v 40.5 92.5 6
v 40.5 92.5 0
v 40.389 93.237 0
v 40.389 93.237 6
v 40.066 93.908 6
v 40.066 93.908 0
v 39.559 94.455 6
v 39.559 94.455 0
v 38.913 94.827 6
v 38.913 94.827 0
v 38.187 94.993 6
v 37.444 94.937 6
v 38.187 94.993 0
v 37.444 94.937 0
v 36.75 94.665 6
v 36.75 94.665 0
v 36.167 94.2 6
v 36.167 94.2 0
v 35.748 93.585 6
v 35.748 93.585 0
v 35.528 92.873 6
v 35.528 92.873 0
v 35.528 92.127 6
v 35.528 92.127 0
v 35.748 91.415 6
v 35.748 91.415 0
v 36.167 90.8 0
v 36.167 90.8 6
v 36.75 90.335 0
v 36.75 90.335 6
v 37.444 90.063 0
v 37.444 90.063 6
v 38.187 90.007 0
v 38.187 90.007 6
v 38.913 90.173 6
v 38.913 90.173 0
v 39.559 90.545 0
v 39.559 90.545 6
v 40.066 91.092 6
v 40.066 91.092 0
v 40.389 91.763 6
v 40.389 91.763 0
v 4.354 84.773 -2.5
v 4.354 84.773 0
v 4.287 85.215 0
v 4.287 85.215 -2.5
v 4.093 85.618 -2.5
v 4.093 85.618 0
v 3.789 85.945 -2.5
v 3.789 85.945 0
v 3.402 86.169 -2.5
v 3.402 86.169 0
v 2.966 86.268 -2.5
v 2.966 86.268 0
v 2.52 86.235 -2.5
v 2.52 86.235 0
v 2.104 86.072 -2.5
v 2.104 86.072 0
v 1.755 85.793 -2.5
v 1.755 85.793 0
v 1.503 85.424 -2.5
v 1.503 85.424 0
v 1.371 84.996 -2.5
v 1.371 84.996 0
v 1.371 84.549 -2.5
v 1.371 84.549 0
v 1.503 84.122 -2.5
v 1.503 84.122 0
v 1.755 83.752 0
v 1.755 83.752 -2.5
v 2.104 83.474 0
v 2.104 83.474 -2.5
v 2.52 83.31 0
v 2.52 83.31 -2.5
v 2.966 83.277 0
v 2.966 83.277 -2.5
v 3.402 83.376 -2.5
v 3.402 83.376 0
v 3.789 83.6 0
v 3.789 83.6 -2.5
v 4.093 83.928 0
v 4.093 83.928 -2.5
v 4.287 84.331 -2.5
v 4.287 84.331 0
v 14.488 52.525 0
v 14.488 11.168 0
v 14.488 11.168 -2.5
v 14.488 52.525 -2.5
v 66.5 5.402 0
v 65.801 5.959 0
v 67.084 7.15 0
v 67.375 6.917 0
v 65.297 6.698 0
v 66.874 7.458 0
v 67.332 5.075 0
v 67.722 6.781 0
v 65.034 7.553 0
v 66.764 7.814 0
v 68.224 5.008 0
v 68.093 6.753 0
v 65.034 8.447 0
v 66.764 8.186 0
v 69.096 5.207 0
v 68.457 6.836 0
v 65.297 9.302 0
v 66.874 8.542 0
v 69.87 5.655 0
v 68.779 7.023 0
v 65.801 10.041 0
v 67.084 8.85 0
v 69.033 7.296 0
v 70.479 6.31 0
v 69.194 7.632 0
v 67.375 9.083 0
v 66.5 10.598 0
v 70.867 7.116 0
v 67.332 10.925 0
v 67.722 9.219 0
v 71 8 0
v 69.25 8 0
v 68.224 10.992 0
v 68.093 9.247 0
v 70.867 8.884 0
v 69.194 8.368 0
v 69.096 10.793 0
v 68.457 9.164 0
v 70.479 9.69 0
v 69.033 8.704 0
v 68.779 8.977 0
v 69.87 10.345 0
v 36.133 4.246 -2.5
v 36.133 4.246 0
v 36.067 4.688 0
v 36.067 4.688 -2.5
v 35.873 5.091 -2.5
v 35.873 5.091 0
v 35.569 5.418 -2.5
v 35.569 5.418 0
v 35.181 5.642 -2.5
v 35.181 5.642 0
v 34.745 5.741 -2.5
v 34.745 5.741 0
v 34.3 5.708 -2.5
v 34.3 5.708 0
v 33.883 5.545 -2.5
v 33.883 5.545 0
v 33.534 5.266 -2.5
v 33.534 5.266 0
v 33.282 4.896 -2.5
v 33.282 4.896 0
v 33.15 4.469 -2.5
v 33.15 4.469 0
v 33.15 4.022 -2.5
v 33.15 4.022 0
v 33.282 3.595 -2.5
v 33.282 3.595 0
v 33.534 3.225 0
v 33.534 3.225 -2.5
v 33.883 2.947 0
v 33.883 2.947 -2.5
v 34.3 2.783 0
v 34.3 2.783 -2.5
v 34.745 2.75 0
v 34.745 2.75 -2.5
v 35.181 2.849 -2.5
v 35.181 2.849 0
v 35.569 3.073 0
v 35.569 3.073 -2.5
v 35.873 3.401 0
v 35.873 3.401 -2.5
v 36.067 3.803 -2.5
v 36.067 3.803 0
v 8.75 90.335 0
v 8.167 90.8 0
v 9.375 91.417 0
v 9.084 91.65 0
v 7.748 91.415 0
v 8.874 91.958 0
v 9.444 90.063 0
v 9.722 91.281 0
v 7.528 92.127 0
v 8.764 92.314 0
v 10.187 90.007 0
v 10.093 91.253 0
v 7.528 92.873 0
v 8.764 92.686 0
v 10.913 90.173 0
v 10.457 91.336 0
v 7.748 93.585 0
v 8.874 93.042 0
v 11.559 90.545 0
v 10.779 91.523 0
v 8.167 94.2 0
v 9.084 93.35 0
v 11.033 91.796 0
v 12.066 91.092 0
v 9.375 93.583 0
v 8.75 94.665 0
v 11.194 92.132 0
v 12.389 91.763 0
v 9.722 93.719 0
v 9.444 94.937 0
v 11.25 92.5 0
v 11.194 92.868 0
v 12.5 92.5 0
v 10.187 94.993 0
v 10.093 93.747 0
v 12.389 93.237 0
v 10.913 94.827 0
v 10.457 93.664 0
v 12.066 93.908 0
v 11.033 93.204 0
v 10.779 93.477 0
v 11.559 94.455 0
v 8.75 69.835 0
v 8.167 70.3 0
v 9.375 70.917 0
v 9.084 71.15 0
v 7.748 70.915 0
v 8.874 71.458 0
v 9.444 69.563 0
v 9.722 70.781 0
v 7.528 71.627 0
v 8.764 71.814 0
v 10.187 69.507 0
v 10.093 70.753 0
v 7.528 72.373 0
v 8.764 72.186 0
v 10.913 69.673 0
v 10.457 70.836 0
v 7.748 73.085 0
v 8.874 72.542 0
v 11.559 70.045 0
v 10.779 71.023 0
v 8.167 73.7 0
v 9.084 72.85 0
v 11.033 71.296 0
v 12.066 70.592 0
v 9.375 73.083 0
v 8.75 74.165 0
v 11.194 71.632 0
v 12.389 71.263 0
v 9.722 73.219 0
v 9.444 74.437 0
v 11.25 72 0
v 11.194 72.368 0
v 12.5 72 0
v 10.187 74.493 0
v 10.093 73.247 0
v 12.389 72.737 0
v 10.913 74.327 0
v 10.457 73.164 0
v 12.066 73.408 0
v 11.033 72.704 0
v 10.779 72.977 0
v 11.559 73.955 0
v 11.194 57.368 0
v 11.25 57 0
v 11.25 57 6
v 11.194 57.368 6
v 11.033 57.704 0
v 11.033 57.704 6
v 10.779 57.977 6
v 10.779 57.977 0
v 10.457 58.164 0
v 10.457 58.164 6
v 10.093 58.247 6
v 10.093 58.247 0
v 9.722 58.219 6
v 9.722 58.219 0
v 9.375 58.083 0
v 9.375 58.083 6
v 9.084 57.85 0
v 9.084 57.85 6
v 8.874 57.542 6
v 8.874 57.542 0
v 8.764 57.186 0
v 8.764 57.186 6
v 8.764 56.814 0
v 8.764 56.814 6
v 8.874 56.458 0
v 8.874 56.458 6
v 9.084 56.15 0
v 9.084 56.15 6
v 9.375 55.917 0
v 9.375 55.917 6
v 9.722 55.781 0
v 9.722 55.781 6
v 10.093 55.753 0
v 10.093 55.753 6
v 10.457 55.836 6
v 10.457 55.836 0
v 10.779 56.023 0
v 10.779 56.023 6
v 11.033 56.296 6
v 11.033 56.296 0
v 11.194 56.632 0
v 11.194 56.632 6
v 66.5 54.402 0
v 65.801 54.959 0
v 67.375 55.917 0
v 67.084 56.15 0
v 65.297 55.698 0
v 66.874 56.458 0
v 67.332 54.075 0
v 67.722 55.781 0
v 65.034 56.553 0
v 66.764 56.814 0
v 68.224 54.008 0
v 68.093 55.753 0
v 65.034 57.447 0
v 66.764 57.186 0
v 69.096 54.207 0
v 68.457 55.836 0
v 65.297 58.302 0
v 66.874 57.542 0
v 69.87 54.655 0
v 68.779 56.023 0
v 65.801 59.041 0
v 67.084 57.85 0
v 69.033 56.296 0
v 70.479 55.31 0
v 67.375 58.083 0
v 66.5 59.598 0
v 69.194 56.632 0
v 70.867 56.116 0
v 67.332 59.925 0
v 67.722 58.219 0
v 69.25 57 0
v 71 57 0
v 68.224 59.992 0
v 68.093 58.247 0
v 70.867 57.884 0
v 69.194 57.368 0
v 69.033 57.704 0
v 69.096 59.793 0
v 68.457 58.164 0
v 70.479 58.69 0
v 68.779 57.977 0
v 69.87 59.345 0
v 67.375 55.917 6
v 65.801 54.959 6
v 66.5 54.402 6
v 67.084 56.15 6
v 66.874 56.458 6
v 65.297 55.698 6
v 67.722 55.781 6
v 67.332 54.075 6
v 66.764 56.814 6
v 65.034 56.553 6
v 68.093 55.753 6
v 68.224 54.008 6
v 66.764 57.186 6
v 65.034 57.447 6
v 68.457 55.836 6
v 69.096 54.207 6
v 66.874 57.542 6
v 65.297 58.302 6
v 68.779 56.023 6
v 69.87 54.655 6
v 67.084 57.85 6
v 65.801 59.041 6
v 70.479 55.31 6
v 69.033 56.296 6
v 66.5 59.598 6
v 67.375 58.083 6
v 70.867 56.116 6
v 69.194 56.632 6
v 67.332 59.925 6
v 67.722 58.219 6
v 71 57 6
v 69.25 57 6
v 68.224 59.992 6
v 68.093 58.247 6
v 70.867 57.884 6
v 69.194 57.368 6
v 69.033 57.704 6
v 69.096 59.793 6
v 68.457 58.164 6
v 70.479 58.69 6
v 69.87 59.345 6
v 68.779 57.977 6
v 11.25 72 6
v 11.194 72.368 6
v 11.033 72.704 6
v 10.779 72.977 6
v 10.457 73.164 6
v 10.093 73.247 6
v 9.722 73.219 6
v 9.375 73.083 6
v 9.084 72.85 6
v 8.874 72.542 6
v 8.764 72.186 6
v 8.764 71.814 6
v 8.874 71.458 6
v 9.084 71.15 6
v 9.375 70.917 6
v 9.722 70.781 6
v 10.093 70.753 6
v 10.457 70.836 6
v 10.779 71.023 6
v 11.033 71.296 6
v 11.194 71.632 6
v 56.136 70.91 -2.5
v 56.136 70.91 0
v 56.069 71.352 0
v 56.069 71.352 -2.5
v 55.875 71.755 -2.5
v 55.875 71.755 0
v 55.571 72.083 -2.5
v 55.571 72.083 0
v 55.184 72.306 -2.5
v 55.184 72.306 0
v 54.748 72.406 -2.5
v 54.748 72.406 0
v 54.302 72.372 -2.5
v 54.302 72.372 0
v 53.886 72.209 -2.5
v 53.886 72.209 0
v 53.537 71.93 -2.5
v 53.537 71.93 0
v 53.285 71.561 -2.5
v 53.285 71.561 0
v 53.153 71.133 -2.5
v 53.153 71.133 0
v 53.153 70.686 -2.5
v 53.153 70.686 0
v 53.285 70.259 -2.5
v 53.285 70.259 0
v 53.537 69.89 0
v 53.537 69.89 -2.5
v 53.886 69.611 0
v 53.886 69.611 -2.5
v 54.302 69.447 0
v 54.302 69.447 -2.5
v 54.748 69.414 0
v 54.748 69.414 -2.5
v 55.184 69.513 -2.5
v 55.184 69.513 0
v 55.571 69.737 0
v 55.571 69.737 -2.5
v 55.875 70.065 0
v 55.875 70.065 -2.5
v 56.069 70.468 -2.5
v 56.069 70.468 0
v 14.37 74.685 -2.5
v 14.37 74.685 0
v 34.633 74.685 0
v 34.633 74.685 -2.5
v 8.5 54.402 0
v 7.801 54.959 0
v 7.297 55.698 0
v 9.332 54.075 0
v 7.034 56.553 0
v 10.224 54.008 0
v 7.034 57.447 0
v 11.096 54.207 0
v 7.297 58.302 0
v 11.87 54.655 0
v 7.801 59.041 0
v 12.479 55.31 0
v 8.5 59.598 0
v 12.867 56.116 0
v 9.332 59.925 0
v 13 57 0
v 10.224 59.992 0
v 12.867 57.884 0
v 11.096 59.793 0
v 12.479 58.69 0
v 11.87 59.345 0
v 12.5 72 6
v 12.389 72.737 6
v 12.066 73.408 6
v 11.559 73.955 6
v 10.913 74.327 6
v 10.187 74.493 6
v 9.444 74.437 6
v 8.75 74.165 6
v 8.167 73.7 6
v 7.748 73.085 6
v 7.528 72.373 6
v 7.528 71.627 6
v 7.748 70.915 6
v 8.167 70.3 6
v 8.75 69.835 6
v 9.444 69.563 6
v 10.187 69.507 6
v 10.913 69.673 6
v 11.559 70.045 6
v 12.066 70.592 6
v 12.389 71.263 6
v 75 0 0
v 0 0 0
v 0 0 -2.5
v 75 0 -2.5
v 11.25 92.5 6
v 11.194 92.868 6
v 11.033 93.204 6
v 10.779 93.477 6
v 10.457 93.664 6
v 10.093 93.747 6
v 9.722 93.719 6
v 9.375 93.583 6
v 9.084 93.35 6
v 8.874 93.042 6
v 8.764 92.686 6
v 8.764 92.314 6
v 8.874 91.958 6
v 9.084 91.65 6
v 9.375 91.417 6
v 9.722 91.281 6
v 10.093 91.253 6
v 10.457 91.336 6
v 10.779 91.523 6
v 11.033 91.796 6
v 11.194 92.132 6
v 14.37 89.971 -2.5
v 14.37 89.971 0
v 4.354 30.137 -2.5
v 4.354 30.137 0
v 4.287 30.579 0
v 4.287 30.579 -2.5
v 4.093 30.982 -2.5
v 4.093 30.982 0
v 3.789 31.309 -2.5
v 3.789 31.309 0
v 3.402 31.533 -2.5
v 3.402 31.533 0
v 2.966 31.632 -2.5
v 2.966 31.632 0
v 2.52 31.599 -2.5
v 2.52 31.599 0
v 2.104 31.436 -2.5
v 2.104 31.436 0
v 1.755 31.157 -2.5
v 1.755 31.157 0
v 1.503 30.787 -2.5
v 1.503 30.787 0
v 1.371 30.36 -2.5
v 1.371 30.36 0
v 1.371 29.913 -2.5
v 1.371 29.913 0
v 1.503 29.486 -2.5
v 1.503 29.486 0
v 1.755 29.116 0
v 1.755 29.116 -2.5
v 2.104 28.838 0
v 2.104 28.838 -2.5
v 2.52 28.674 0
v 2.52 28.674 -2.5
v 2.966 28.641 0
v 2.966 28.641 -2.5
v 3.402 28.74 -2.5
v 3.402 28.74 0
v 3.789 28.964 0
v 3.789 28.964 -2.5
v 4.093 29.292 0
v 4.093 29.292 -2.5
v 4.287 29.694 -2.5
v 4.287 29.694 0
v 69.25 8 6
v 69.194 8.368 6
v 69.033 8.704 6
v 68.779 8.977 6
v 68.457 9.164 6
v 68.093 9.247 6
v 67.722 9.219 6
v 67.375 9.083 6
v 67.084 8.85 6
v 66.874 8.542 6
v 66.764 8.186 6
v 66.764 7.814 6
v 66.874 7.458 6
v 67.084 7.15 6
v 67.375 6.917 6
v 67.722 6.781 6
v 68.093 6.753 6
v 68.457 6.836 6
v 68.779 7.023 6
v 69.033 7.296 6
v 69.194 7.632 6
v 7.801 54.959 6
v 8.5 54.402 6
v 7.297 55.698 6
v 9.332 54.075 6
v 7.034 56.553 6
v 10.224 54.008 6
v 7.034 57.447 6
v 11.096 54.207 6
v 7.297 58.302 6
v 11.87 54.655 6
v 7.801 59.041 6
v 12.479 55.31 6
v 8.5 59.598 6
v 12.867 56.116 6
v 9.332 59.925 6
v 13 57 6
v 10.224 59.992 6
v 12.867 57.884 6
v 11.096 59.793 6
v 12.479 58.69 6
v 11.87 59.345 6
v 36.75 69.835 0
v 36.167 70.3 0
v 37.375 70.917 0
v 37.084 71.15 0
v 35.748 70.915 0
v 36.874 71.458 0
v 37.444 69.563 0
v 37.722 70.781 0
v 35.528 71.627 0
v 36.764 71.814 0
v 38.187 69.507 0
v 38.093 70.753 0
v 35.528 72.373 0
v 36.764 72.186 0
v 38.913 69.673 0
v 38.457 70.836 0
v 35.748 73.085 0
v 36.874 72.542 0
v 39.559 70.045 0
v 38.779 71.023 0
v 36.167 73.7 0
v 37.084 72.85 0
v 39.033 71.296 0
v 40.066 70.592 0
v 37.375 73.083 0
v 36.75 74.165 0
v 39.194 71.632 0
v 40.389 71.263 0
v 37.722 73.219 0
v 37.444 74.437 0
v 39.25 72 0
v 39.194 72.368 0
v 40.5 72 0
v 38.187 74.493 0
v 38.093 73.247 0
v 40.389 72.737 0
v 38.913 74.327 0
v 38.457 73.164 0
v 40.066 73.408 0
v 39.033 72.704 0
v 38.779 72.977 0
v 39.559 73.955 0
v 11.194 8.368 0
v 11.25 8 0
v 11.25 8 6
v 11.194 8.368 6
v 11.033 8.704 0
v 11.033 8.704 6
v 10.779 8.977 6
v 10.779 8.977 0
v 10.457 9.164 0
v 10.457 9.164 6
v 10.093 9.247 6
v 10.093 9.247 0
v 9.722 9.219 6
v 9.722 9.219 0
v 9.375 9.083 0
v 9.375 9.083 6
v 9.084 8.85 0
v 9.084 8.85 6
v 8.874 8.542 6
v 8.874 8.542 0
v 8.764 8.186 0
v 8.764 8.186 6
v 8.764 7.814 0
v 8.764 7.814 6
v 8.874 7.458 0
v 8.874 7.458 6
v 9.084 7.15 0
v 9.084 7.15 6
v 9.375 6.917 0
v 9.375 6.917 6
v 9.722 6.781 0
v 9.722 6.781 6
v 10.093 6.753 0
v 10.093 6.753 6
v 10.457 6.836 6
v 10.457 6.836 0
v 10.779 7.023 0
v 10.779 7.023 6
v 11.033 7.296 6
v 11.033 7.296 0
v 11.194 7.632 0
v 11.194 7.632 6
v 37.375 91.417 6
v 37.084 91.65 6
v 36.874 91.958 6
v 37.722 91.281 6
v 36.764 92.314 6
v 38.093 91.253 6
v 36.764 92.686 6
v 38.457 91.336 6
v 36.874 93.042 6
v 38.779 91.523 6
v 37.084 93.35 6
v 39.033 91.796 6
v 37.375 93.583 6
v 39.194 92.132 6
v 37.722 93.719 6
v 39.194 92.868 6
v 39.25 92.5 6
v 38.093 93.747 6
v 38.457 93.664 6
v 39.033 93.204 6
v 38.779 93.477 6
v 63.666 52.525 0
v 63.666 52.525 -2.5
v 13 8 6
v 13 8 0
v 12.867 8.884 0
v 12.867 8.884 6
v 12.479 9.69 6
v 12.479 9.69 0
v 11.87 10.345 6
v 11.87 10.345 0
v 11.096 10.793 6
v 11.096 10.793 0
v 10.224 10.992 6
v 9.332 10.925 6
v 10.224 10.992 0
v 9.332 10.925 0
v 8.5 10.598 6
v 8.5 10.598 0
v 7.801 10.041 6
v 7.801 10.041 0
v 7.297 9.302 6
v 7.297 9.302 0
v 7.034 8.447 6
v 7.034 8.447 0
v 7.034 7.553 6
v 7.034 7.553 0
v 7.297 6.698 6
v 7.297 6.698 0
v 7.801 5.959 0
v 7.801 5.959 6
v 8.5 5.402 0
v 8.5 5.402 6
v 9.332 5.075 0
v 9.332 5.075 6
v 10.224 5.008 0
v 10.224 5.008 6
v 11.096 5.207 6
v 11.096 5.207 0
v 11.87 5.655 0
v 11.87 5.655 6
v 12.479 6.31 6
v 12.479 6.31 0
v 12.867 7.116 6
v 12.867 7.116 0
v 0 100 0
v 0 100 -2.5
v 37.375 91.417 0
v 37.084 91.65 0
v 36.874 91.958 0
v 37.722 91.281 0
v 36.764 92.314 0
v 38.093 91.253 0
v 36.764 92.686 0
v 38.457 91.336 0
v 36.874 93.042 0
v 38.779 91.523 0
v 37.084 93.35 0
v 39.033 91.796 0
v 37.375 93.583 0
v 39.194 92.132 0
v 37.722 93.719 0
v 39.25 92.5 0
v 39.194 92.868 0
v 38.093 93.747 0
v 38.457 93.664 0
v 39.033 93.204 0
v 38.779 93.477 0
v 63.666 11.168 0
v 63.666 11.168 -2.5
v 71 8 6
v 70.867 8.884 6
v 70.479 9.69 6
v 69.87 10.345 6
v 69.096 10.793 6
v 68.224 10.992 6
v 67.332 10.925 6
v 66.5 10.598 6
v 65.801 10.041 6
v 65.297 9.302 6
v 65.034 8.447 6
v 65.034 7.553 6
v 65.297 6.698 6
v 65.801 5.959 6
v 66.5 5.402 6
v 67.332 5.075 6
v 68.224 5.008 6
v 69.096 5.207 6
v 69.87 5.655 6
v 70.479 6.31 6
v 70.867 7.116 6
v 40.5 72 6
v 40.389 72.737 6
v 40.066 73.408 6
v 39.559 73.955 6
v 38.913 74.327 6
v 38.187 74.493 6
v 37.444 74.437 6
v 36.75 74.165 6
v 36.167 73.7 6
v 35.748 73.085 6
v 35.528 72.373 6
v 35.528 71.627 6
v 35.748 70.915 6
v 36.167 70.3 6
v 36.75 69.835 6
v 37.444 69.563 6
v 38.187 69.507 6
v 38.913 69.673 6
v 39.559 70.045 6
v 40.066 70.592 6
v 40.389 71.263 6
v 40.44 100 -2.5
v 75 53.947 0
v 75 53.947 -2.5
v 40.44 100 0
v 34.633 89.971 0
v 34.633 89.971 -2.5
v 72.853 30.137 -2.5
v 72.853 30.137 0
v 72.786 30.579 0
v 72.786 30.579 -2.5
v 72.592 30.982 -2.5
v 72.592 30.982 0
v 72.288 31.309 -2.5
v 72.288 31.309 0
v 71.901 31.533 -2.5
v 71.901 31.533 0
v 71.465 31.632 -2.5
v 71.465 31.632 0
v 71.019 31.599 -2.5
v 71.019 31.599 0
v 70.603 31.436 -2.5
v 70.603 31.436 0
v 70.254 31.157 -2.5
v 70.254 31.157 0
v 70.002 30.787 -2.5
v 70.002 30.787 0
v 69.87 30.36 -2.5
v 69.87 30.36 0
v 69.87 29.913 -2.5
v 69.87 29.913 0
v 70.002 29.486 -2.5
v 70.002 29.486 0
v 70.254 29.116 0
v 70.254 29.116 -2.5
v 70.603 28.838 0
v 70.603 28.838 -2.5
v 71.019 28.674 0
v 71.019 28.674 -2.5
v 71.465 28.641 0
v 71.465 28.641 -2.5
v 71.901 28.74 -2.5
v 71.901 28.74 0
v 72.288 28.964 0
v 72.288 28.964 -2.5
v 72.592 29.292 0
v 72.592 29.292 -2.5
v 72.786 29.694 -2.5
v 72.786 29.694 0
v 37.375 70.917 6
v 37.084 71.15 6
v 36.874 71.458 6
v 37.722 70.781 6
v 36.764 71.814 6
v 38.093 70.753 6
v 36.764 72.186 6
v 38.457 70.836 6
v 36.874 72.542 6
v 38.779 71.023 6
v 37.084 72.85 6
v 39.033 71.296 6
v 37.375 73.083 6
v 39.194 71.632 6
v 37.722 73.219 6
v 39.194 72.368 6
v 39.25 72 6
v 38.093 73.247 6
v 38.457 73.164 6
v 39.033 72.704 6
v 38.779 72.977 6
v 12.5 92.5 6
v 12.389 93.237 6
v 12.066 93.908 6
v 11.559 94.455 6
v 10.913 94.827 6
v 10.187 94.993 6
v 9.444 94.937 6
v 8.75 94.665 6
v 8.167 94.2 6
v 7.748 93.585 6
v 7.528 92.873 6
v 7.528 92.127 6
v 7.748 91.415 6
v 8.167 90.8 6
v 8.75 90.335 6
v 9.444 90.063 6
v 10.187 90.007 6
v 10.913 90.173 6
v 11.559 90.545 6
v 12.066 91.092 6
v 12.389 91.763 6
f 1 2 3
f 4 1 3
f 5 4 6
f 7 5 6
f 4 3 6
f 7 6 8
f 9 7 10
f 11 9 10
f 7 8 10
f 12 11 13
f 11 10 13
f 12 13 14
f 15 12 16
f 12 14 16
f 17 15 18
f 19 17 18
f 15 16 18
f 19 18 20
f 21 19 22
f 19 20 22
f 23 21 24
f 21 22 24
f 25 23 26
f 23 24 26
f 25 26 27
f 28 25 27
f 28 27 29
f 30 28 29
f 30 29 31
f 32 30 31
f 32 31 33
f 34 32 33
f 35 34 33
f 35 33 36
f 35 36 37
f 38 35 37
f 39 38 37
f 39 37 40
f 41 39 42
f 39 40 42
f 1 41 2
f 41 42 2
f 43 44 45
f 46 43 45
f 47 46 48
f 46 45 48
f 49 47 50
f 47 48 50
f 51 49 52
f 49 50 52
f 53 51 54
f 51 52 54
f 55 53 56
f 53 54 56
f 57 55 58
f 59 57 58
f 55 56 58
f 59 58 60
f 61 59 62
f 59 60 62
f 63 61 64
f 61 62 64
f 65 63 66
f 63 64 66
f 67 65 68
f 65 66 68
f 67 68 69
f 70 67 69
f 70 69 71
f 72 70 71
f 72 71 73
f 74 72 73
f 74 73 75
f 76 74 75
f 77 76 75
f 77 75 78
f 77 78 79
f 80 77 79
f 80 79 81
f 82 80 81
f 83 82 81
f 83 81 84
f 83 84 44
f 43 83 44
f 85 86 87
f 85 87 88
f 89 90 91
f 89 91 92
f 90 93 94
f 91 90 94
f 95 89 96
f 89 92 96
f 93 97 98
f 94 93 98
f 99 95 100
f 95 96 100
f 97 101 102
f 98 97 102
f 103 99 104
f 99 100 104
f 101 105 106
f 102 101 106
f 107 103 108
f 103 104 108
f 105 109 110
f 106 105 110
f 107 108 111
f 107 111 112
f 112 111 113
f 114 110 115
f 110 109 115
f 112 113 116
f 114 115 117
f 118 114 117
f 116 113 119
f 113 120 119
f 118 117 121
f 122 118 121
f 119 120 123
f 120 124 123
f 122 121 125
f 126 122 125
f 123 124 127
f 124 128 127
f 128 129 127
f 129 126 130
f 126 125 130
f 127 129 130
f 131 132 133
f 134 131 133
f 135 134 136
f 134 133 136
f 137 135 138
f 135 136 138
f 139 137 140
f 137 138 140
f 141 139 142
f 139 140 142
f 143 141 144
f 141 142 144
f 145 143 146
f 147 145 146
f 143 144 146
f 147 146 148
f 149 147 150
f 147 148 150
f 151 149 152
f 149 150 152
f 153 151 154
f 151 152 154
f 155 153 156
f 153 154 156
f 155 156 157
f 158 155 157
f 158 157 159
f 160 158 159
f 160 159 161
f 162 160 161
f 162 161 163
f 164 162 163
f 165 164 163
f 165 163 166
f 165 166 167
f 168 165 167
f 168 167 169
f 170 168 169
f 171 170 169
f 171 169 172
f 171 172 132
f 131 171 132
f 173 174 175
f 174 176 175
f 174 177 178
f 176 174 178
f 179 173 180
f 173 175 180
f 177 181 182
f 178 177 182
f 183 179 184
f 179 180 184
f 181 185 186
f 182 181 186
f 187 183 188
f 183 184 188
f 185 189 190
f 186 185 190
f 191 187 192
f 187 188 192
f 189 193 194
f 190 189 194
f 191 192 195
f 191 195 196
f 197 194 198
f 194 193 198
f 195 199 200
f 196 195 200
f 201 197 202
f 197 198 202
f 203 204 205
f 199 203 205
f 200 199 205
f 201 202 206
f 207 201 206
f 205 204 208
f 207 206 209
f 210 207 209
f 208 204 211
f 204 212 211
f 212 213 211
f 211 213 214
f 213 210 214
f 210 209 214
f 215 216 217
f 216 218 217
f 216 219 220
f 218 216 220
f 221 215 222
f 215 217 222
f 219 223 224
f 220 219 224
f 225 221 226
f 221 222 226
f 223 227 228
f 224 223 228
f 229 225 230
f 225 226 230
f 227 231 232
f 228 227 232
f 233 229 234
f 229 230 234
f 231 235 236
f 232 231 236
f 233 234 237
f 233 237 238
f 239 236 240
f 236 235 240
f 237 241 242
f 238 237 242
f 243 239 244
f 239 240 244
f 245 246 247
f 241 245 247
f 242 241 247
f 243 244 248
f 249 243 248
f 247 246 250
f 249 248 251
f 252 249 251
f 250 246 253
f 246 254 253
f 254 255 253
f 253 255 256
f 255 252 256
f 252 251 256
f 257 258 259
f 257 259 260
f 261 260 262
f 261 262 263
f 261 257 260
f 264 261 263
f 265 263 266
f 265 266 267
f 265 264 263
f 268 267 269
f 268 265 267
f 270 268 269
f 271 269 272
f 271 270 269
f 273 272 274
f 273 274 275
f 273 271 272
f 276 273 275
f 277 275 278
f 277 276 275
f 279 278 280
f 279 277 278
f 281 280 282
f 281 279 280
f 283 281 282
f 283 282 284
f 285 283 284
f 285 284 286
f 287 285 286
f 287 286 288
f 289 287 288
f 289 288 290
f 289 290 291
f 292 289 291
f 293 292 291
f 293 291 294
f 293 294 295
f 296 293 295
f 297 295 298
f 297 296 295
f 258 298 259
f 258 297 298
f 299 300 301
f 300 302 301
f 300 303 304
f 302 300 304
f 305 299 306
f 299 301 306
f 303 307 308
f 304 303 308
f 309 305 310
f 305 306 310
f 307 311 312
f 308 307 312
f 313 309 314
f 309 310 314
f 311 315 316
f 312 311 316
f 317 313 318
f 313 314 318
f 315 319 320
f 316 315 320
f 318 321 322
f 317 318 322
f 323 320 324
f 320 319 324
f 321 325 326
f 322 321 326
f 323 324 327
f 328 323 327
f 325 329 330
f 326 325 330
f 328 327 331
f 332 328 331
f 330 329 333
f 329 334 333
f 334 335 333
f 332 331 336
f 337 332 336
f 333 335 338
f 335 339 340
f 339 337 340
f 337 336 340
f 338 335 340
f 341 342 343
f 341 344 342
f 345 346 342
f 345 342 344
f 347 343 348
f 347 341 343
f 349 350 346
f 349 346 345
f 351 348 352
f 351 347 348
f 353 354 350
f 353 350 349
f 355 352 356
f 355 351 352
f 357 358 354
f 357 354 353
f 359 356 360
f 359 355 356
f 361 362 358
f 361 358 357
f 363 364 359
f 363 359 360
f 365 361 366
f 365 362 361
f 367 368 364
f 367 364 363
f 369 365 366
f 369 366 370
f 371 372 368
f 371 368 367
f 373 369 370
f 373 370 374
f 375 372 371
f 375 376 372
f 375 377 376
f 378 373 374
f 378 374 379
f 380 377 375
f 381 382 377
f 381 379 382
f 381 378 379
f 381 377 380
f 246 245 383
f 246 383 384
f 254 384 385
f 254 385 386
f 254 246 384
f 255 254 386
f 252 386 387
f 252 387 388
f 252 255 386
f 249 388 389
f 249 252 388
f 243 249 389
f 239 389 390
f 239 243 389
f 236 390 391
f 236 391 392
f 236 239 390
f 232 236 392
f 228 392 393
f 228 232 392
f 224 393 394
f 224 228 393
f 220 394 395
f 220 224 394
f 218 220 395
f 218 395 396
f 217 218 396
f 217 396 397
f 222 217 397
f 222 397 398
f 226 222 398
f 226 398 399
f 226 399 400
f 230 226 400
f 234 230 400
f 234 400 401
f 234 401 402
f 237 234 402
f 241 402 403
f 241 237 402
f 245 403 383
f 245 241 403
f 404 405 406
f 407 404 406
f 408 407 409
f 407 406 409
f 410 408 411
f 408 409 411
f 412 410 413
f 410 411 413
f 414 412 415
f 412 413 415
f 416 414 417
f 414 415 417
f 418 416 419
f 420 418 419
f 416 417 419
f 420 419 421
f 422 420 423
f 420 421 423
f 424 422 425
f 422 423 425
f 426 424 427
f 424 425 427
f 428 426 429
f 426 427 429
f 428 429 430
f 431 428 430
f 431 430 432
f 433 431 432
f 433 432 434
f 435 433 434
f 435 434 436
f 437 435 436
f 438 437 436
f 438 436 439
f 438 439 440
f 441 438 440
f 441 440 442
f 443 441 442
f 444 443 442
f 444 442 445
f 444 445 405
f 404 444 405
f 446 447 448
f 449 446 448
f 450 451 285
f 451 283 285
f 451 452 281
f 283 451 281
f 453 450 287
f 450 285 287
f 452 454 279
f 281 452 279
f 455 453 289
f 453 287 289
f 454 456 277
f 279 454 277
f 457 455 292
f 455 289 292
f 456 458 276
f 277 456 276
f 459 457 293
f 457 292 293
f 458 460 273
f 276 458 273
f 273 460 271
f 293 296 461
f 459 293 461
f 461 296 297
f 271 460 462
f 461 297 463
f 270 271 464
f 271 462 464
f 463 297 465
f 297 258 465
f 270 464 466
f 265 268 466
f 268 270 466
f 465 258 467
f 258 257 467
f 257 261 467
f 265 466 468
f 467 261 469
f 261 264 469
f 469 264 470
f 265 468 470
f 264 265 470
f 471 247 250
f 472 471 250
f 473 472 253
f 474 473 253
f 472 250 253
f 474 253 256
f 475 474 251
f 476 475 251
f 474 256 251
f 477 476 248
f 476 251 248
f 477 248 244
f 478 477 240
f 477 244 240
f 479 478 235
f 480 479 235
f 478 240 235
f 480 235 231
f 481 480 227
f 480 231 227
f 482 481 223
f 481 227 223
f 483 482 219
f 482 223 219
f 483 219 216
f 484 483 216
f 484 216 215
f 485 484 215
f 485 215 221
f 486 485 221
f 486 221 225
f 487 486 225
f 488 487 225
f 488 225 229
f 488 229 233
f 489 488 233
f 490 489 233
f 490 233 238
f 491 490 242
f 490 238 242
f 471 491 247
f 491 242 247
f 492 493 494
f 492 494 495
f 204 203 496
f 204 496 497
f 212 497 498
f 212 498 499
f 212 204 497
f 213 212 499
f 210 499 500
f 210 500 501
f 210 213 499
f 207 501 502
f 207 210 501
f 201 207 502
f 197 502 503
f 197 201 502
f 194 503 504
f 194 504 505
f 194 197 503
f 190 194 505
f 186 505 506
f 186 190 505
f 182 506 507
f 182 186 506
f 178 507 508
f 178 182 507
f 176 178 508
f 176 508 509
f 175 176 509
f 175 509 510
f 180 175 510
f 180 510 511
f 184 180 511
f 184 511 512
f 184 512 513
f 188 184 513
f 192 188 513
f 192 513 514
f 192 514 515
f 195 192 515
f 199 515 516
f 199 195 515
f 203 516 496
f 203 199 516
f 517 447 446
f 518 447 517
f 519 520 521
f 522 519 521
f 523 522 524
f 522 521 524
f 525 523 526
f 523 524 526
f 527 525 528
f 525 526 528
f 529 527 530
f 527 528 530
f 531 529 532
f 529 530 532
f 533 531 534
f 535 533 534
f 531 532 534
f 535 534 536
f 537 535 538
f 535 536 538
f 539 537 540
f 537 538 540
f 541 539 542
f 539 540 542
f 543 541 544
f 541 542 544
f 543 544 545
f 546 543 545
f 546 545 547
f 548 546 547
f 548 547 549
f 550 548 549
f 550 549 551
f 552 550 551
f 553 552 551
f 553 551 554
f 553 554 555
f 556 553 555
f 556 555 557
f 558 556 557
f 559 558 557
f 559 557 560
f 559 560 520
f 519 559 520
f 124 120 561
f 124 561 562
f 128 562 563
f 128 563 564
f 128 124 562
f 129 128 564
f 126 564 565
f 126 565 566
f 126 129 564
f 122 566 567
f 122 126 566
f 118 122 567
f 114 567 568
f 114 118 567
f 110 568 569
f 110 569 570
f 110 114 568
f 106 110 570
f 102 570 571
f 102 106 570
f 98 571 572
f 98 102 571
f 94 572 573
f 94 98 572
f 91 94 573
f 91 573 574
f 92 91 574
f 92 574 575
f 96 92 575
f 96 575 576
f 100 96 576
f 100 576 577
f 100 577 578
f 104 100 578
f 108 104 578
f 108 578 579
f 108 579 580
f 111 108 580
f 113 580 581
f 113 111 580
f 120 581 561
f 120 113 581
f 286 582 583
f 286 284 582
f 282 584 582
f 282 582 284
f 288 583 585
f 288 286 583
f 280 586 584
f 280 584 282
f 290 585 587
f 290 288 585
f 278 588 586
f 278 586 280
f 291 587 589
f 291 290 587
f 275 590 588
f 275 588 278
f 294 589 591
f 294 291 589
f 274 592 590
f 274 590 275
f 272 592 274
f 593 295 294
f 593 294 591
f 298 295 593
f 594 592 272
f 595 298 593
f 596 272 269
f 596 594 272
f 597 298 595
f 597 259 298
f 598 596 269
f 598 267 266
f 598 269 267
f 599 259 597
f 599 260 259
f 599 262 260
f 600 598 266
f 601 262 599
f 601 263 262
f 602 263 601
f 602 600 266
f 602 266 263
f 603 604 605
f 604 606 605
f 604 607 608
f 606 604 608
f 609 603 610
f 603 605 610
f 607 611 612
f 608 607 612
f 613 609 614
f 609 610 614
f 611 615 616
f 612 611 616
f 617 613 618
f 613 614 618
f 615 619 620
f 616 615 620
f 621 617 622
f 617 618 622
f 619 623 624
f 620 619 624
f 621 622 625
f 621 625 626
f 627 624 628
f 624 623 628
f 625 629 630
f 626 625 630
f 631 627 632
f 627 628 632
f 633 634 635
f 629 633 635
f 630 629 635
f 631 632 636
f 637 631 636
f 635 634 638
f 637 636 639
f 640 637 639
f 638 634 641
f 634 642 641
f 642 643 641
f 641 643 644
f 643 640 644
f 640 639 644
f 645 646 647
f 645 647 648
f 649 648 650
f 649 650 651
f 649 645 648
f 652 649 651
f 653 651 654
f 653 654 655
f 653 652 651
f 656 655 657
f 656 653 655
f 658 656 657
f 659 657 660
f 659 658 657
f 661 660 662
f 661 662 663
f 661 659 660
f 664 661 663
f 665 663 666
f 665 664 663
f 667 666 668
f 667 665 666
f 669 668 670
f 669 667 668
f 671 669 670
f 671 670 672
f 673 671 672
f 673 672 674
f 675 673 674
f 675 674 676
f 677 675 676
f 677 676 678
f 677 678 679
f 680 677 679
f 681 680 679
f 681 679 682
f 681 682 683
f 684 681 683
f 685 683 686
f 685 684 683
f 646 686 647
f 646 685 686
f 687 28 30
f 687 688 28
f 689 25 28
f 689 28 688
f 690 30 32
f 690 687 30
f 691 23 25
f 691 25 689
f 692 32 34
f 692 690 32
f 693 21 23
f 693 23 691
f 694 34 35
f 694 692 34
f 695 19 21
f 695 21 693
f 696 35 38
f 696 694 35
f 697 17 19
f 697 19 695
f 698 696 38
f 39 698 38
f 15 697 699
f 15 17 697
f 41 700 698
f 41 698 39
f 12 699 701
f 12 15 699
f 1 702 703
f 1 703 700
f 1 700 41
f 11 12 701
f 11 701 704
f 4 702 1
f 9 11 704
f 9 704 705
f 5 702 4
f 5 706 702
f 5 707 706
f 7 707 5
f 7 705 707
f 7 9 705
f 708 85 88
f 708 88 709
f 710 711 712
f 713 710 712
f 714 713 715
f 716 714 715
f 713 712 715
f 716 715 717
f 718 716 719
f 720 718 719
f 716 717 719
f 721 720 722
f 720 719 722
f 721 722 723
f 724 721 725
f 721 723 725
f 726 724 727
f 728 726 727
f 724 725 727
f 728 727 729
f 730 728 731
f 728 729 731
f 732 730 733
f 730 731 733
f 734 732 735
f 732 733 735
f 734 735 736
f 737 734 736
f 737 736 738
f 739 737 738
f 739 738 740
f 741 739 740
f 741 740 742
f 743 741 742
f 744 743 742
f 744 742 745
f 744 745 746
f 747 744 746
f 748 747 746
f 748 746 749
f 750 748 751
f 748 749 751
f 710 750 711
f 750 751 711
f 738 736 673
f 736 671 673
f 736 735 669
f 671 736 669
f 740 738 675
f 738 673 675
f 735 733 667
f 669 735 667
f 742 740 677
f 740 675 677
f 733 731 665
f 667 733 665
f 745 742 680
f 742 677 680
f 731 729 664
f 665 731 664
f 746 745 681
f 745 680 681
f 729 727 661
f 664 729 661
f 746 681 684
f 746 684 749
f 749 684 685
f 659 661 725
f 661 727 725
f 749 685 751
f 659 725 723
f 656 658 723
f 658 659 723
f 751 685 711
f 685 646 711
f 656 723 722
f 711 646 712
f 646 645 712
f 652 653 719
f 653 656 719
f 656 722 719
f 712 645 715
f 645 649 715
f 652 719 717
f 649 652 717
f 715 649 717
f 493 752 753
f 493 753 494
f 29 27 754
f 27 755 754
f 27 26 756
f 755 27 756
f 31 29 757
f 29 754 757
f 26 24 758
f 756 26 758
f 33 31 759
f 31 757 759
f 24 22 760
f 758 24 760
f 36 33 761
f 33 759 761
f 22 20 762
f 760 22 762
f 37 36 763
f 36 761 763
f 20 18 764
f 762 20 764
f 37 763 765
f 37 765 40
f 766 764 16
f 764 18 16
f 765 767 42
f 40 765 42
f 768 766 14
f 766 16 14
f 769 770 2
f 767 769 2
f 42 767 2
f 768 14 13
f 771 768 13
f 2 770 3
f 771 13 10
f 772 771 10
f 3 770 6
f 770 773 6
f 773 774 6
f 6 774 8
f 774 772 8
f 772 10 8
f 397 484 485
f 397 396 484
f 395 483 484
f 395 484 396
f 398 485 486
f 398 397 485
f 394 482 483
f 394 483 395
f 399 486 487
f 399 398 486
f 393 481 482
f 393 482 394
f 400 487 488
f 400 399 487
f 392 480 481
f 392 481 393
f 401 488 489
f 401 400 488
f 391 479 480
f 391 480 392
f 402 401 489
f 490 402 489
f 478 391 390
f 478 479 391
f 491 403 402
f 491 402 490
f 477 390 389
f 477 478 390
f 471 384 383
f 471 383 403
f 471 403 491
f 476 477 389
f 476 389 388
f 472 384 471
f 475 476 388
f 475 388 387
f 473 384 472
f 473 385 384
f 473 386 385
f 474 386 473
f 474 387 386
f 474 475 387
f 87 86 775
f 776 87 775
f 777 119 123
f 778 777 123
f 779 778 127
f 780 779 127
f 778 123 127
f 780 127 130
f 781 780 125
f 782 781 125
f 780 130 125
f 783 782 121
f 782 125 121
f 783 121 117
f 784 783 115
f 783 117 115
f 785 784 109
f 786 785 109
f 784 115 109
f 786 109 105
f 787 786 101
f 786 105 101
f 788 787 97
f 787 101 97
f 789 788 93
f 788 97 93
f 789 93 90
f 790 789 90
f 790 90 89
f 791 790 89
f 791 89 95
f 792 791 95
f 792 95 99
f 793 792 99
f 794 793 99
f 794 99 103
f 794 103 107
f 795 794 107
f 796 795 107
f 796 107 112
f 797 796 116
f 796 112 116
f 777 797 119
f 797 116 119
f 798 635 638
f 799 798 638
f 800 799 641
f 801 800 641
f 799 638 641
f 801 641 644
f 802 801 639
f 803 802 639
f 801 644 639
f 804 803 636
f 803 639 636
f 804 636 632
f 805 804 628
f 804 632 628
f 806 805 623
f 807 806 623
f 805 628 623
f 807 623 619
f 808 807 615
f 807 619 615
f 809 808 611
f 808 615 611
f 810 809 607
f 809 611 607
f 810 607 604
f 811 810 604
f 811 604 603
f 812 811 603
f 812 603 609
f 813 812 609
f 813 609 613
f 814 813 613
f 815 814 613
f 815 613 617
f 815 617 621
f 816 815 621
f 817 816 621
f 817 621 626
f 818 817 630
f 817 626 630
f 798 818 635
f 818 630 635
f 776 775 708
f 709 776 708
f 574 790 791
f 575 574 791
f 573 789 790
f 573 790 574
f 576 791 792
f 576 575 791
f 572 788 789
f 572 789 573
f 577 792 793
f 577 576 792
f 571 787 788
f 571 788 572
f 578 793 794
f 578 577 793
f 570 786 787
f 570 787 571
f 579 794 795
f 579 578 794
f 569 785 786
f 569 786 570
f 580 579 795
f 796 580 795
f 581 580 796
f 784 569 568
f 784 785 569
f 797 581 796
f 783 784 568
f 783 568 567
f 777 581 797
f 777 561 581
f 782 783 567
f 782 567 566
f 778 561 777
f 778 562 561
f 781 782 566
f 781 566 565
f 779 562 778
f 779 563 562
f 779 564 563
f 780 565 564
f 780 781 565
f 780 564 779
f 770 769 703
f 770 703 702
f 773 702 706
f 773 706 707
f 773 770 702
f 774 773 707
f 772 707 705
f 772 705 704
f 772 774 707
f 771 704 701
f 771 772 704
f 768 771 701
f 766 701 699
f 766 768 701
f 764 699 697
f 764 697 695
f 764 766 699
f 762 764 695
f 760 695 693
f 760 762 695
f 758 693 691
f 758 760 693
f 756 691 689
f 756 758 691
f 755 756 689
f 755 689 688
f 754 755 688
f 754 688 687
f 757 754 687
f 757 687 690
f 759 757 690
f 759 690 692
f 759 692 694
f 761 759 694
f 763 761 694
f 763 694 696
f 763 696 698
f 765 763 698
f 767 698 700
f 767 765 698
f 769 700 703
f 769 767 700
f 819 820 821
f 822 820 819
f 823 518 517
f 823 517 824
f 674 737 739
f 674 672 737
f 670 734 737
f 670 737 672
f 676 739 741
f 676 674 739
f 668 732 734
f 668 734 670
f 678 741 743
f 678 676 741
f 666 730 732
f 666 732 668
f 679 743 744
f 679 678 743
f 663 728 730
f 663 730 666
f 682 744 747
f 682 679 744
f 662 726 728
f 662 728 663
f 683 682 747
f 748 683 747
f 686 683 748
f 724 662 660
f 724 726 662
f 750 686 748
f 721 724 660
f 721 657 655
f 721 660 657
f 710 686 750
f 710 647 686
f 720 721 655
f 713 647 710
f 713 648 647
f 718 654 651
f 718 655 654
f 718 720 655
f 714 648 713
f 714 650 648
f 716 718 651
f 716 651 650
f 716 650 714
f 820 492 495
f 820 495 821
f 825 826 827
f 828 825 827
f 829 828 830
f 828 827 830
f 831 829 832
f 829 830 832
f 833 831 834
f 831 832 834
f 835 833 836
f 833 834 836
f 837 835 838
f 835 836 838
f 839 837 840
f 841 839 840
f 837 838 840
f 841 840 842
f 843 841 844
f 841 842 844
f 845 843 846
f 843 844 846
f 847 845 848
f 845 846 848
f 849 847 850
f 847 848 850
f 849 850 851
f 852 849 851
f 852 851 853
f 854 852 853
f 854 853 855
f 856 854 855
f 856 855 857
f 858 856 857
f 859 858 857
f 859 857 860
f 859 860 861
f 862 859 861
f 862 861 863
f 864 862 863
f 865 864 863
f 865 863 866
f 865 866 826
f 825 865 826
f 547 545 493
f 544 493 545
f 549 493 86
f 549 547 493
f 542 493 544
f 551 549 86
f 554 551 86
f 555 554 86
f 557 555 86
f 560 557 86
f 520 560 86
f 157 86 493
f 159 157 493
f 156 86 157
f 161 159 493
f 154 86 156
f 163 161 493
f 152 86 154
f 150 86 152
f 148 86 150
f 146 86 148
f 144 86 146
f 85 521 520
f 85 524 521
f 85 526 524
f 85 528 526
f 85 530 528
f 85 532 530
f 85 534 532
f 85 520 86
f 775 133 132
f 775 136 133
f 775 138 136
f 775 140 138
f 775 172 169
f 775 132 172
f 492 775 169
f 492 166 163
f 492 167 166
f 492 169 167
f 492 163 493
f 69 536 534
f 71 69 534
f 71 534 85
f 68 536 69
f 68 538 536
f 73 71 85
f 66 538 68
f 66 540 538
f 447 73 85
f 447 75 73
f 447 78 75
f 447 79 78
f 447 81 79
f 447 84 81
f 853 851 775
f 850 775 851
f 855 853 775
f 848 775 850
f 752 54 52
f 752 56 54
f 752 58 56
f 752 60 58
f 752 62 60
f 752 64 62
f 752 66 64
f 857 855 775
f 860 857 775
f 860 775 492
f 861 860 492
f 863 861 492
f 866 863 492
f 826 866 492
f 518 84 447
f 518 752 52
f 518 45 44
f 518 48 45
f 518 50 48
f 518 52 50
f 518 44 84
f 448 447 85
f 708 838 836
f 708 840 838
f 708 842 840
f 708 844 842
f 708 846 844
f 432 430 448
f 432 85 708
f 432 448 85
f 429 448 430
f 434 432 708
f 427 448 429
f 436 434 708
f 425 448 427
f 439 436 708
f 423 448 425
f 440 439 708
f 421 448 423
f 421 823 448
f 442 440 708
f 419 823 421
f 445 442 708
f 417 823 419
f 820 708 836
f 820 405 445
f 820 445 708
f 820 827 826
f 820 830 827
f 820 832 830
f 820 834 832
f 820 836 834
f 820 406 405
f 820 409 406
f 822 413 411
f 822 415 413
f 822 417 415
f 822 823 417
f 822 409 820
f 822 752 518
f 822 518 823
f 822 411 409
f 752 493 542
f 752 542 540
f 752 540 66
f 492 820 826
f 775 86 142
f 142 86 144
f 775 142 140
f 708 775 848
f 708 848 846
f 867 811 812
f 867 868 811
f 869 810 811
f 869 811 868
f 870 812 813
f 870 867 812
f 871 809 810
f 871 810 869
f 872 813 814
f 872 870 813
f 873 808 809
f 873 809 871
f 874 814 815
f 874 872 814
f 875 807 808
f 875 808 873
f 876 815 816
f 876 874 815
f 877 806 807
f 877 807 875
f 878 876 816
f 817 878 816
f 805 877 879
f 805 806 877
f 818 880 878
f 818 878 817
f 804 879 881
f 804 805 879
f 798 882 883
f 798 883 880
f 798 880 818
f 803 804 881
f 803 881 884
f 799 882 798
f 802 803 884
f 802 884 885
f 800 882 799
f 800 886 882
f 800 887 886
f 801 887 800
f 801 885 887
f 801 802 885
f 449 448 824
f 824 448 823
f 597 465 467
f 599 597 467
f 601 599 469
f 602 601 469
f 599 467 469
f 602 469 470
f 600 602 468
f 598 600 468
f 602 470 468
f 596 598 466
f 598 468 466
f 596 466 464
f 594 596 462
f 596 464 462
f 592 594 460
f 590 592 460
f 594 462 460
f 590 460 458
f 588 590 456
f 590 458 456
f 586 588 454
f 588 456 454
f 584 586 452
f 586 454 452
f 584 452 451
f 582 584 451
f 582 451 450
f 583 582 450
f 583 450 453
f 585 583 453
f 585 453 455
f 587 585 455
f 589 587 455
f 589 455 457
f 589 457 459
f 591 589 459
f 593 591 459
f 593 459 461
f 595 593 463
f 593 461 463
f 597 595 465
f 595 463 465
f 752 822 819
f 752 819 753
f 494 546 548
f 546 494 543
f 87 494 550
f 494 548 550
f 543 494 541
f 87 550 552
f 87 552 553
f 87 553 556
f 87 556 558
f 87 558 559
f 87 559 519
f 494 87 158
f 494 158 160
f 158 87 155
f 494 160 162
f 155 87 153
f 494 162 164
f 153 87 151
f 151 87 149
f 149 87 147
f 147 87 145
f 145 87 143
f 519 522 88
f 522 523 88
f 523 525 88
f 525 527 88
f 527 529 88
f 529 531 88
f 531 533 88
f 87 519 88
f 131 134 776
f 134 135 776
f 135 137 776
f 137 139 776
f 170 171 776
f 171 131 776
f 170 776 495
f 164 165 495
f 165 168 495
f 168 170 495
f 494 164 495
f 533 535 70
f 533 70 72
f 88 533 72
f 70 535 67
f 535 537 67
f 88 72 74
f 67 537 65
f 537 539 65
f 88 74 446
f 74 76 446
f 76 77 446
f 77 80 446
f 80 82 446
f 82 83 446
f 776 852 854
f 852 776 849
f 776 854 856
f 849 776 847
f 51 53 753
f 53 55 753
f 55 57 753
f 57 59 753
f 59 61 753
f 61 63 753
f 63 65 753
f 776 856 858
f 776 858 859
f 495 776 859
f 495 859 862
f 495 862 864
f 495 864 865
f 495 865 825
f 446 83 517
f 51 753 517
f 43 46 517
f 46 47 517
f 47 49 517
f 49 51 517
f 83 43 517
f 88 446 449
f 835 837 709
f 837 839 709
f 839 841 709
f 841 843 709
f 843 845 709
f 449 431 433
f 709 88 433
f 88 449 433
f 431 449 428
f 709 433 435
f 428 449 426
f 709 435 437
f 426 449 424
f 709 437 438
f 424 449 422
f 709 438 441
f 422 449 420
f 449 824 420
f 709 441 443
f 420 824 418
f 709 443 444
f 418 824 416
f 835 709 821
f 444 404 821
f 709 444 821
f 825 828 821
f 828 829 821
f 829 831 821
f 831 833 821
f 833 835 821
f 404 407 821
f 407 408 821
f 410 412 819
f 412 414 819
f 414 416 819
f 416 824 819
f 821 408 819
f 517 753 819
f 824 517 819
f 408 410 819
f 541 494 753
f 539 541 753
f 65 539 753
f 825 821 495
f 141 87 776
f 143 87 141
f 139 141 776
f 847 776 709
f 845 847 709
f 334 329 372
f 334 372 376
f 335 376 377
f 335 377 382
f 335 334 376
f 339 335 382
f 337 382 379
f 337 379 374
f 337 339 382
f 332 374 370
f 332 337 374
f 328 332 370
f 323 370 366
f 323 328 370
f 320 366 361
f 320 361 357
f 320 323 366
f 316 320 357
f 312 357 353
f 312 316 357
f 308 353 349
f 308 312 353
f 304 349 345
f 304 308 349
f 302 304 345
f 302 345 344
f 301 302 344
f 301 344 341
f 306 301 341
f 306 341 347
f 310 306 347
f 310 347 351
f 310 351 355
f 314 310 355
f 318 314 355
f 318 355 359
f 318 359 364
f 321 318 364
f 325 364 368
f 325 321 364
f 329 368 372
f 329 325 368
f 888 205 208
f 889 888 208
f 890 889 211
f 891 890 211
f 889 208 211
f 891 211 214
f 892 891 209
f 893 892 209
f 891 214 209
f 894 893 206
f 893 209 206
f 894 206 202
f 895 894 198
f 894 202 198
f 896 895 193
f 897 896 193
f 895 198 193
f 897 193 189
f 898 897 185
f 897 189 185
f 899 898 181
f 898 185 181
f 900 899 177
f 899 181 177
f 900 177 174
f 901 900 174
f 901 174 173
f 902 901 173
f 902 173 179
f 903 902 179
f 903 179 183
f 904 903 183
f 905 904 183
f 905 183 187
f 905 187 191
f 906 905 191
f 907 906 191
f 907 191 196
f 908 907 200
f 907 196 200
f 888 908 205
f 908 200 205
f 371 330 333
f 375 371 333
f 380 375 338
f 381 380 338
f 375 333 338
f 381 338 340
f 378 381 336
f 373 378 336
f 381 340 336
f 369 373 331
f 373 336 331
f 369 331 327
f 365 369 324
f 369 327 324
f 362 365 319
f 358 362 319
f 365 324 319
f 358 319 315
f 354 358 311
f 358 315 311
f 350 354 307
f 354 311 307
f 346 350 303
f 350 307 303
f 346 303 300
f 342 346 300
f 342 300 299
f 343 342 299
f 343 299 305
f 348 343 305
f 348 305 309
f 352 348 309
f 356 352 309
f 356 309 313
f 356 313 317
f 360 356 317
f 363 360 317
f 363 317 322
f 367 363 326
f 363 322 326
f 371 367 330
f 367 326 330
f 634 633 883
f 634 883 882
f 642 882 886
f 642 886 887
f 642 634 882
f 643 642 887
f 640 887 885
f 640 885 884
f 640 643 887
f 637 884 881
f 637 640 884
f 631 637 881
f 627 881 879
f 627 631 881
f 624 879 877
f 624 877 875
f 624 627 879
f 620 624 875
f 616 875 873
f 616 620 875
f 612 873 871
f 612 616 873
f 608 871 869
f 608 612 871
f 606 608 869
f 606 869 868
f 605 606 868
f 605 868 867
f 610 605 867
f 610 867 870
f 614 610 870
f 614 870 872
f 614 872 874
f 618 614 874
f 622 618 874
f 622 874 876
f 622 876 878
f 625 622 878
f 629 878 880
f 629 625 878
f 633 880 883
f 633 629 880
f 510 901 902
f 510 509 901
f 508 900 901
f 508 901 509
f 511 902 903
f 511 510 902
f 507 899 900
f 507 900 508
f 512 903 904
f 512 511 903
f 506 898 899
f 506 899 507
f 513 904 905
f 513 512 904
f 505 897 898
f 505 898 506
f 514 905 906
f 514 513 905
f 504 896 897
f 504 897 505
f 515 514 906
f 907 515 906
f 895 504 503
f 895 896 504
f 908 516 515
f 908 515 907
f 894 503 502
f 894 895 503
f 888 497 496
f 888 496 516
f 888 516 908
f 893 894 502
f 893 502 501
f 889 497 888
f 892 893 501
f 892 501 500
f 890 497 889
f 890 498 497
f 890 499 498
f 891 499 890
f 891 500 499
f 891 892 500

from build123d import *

# Parameters (mm, degrees)
F1_R     = 3
F1_R_2   = 1.25
F1_R_3   = 2.5
F2_DEPTH = 6
F4_DEPTH = 2.5
F3_W     = 49.178135
F3_H     = 41.35703
F3_W_2   = 20.263761
F3_H_2   = 15.286692
F5_DEPTH = 25
F6_R     = 1.5
F7_DEPTH = 25


with BuildPart() as f2:
    # F1 (on Top) → F2 (new body)
    with BuildSketch(Plane.XY):
        with Locations((10, 8)):
            Circle(F1_R)
        with Locations((10, 8)):
            Circle(F1_R_2, mode=Mode.SUBTRACT)
        with Locations((10, 57)):
            Circle(F1_R)
        with Locations((10, 57)):
            Circle(F1_R_2, mode=Mode.SUBTRACT)
        with Locations((68, 8)):
            Circle(F1_R)
        with Locations((68, 8)):
            Circle(F1_R_2, mode=Mode.SUBTRACT)
        with Locations((68, 57)):
            Circle(F1_R)
        with Locations((68, 57)):
            Circle(F1_R_2, mode=Mode.SUBTRACT)
        with Locations((10, 72)):
            Circle(F1_R_3)
        with Locations((10, 72)):
            Circle(F1_R_2, mode=Mode.SUBTRACT)
        with Locations((10, 92.5)):
            Circle(F1_R_3)
        with Locations((10, 92.5)):
            Circle(F1_R_2, mode=Mode.SUBTRACT)
        with Locations((38, 72)):
            Circle(F1_R_3)
        with Locations((38, 72)):
            Circle(F1_R_2, mode=Mode.SUBTRACT)
        with Locations((38, 92.5)):
            Circle(F1_R_3)
        with Locations((38, 92.5)):
            Circle(F1_R_2, mode=Mode.SUBTRACT)
    extrude(amount=F2_DEPTH)


with BuildPart() as f4:
    # F0 (on Top) → F4 (new body)
    with BuildSketch(Plane.XY):
        Polygon((0, 100), (0, 0), (75, 0), (75, 53.94689), (40.439963, 100), align=None)
    extrude(amount=-F4_DEPTH)

    # F3 (on Top) → F5 (cut)
    with BuildSketch(Plane.XY):
        with Locations((39.077194, 31.846353)):
            Rectangle(F3_W, F3_H)
        with Locations((24.501506, 82.328003)):
            Rectangle(F3_W_2, F3_H_2)
    extrude(amount=-F5_DEPTH, mode=Mode.SUBTRACT)

    # F6 (on face) → F7 (cut)
    with BuildSketch(Plane.XY):
        with Locations((2.854123, 84.772676)):
            Circle(F6_R)
        with Locations((2.854123, 30.136598)):
            Circle(F6_R)
        with Locations((54.636084, 70.909791)):
            Circle(F6_R)
        with Locations((71.353093, 30.136598)):
            Circle(F6_R)
        with Locations((34.633387, 4.245619)):
            Circle(F6_R)
    extrude(amount=-F7_DEPTH, mode=Mode.SUBTRACT)


solid = Compound([f2.part, f4.part])
